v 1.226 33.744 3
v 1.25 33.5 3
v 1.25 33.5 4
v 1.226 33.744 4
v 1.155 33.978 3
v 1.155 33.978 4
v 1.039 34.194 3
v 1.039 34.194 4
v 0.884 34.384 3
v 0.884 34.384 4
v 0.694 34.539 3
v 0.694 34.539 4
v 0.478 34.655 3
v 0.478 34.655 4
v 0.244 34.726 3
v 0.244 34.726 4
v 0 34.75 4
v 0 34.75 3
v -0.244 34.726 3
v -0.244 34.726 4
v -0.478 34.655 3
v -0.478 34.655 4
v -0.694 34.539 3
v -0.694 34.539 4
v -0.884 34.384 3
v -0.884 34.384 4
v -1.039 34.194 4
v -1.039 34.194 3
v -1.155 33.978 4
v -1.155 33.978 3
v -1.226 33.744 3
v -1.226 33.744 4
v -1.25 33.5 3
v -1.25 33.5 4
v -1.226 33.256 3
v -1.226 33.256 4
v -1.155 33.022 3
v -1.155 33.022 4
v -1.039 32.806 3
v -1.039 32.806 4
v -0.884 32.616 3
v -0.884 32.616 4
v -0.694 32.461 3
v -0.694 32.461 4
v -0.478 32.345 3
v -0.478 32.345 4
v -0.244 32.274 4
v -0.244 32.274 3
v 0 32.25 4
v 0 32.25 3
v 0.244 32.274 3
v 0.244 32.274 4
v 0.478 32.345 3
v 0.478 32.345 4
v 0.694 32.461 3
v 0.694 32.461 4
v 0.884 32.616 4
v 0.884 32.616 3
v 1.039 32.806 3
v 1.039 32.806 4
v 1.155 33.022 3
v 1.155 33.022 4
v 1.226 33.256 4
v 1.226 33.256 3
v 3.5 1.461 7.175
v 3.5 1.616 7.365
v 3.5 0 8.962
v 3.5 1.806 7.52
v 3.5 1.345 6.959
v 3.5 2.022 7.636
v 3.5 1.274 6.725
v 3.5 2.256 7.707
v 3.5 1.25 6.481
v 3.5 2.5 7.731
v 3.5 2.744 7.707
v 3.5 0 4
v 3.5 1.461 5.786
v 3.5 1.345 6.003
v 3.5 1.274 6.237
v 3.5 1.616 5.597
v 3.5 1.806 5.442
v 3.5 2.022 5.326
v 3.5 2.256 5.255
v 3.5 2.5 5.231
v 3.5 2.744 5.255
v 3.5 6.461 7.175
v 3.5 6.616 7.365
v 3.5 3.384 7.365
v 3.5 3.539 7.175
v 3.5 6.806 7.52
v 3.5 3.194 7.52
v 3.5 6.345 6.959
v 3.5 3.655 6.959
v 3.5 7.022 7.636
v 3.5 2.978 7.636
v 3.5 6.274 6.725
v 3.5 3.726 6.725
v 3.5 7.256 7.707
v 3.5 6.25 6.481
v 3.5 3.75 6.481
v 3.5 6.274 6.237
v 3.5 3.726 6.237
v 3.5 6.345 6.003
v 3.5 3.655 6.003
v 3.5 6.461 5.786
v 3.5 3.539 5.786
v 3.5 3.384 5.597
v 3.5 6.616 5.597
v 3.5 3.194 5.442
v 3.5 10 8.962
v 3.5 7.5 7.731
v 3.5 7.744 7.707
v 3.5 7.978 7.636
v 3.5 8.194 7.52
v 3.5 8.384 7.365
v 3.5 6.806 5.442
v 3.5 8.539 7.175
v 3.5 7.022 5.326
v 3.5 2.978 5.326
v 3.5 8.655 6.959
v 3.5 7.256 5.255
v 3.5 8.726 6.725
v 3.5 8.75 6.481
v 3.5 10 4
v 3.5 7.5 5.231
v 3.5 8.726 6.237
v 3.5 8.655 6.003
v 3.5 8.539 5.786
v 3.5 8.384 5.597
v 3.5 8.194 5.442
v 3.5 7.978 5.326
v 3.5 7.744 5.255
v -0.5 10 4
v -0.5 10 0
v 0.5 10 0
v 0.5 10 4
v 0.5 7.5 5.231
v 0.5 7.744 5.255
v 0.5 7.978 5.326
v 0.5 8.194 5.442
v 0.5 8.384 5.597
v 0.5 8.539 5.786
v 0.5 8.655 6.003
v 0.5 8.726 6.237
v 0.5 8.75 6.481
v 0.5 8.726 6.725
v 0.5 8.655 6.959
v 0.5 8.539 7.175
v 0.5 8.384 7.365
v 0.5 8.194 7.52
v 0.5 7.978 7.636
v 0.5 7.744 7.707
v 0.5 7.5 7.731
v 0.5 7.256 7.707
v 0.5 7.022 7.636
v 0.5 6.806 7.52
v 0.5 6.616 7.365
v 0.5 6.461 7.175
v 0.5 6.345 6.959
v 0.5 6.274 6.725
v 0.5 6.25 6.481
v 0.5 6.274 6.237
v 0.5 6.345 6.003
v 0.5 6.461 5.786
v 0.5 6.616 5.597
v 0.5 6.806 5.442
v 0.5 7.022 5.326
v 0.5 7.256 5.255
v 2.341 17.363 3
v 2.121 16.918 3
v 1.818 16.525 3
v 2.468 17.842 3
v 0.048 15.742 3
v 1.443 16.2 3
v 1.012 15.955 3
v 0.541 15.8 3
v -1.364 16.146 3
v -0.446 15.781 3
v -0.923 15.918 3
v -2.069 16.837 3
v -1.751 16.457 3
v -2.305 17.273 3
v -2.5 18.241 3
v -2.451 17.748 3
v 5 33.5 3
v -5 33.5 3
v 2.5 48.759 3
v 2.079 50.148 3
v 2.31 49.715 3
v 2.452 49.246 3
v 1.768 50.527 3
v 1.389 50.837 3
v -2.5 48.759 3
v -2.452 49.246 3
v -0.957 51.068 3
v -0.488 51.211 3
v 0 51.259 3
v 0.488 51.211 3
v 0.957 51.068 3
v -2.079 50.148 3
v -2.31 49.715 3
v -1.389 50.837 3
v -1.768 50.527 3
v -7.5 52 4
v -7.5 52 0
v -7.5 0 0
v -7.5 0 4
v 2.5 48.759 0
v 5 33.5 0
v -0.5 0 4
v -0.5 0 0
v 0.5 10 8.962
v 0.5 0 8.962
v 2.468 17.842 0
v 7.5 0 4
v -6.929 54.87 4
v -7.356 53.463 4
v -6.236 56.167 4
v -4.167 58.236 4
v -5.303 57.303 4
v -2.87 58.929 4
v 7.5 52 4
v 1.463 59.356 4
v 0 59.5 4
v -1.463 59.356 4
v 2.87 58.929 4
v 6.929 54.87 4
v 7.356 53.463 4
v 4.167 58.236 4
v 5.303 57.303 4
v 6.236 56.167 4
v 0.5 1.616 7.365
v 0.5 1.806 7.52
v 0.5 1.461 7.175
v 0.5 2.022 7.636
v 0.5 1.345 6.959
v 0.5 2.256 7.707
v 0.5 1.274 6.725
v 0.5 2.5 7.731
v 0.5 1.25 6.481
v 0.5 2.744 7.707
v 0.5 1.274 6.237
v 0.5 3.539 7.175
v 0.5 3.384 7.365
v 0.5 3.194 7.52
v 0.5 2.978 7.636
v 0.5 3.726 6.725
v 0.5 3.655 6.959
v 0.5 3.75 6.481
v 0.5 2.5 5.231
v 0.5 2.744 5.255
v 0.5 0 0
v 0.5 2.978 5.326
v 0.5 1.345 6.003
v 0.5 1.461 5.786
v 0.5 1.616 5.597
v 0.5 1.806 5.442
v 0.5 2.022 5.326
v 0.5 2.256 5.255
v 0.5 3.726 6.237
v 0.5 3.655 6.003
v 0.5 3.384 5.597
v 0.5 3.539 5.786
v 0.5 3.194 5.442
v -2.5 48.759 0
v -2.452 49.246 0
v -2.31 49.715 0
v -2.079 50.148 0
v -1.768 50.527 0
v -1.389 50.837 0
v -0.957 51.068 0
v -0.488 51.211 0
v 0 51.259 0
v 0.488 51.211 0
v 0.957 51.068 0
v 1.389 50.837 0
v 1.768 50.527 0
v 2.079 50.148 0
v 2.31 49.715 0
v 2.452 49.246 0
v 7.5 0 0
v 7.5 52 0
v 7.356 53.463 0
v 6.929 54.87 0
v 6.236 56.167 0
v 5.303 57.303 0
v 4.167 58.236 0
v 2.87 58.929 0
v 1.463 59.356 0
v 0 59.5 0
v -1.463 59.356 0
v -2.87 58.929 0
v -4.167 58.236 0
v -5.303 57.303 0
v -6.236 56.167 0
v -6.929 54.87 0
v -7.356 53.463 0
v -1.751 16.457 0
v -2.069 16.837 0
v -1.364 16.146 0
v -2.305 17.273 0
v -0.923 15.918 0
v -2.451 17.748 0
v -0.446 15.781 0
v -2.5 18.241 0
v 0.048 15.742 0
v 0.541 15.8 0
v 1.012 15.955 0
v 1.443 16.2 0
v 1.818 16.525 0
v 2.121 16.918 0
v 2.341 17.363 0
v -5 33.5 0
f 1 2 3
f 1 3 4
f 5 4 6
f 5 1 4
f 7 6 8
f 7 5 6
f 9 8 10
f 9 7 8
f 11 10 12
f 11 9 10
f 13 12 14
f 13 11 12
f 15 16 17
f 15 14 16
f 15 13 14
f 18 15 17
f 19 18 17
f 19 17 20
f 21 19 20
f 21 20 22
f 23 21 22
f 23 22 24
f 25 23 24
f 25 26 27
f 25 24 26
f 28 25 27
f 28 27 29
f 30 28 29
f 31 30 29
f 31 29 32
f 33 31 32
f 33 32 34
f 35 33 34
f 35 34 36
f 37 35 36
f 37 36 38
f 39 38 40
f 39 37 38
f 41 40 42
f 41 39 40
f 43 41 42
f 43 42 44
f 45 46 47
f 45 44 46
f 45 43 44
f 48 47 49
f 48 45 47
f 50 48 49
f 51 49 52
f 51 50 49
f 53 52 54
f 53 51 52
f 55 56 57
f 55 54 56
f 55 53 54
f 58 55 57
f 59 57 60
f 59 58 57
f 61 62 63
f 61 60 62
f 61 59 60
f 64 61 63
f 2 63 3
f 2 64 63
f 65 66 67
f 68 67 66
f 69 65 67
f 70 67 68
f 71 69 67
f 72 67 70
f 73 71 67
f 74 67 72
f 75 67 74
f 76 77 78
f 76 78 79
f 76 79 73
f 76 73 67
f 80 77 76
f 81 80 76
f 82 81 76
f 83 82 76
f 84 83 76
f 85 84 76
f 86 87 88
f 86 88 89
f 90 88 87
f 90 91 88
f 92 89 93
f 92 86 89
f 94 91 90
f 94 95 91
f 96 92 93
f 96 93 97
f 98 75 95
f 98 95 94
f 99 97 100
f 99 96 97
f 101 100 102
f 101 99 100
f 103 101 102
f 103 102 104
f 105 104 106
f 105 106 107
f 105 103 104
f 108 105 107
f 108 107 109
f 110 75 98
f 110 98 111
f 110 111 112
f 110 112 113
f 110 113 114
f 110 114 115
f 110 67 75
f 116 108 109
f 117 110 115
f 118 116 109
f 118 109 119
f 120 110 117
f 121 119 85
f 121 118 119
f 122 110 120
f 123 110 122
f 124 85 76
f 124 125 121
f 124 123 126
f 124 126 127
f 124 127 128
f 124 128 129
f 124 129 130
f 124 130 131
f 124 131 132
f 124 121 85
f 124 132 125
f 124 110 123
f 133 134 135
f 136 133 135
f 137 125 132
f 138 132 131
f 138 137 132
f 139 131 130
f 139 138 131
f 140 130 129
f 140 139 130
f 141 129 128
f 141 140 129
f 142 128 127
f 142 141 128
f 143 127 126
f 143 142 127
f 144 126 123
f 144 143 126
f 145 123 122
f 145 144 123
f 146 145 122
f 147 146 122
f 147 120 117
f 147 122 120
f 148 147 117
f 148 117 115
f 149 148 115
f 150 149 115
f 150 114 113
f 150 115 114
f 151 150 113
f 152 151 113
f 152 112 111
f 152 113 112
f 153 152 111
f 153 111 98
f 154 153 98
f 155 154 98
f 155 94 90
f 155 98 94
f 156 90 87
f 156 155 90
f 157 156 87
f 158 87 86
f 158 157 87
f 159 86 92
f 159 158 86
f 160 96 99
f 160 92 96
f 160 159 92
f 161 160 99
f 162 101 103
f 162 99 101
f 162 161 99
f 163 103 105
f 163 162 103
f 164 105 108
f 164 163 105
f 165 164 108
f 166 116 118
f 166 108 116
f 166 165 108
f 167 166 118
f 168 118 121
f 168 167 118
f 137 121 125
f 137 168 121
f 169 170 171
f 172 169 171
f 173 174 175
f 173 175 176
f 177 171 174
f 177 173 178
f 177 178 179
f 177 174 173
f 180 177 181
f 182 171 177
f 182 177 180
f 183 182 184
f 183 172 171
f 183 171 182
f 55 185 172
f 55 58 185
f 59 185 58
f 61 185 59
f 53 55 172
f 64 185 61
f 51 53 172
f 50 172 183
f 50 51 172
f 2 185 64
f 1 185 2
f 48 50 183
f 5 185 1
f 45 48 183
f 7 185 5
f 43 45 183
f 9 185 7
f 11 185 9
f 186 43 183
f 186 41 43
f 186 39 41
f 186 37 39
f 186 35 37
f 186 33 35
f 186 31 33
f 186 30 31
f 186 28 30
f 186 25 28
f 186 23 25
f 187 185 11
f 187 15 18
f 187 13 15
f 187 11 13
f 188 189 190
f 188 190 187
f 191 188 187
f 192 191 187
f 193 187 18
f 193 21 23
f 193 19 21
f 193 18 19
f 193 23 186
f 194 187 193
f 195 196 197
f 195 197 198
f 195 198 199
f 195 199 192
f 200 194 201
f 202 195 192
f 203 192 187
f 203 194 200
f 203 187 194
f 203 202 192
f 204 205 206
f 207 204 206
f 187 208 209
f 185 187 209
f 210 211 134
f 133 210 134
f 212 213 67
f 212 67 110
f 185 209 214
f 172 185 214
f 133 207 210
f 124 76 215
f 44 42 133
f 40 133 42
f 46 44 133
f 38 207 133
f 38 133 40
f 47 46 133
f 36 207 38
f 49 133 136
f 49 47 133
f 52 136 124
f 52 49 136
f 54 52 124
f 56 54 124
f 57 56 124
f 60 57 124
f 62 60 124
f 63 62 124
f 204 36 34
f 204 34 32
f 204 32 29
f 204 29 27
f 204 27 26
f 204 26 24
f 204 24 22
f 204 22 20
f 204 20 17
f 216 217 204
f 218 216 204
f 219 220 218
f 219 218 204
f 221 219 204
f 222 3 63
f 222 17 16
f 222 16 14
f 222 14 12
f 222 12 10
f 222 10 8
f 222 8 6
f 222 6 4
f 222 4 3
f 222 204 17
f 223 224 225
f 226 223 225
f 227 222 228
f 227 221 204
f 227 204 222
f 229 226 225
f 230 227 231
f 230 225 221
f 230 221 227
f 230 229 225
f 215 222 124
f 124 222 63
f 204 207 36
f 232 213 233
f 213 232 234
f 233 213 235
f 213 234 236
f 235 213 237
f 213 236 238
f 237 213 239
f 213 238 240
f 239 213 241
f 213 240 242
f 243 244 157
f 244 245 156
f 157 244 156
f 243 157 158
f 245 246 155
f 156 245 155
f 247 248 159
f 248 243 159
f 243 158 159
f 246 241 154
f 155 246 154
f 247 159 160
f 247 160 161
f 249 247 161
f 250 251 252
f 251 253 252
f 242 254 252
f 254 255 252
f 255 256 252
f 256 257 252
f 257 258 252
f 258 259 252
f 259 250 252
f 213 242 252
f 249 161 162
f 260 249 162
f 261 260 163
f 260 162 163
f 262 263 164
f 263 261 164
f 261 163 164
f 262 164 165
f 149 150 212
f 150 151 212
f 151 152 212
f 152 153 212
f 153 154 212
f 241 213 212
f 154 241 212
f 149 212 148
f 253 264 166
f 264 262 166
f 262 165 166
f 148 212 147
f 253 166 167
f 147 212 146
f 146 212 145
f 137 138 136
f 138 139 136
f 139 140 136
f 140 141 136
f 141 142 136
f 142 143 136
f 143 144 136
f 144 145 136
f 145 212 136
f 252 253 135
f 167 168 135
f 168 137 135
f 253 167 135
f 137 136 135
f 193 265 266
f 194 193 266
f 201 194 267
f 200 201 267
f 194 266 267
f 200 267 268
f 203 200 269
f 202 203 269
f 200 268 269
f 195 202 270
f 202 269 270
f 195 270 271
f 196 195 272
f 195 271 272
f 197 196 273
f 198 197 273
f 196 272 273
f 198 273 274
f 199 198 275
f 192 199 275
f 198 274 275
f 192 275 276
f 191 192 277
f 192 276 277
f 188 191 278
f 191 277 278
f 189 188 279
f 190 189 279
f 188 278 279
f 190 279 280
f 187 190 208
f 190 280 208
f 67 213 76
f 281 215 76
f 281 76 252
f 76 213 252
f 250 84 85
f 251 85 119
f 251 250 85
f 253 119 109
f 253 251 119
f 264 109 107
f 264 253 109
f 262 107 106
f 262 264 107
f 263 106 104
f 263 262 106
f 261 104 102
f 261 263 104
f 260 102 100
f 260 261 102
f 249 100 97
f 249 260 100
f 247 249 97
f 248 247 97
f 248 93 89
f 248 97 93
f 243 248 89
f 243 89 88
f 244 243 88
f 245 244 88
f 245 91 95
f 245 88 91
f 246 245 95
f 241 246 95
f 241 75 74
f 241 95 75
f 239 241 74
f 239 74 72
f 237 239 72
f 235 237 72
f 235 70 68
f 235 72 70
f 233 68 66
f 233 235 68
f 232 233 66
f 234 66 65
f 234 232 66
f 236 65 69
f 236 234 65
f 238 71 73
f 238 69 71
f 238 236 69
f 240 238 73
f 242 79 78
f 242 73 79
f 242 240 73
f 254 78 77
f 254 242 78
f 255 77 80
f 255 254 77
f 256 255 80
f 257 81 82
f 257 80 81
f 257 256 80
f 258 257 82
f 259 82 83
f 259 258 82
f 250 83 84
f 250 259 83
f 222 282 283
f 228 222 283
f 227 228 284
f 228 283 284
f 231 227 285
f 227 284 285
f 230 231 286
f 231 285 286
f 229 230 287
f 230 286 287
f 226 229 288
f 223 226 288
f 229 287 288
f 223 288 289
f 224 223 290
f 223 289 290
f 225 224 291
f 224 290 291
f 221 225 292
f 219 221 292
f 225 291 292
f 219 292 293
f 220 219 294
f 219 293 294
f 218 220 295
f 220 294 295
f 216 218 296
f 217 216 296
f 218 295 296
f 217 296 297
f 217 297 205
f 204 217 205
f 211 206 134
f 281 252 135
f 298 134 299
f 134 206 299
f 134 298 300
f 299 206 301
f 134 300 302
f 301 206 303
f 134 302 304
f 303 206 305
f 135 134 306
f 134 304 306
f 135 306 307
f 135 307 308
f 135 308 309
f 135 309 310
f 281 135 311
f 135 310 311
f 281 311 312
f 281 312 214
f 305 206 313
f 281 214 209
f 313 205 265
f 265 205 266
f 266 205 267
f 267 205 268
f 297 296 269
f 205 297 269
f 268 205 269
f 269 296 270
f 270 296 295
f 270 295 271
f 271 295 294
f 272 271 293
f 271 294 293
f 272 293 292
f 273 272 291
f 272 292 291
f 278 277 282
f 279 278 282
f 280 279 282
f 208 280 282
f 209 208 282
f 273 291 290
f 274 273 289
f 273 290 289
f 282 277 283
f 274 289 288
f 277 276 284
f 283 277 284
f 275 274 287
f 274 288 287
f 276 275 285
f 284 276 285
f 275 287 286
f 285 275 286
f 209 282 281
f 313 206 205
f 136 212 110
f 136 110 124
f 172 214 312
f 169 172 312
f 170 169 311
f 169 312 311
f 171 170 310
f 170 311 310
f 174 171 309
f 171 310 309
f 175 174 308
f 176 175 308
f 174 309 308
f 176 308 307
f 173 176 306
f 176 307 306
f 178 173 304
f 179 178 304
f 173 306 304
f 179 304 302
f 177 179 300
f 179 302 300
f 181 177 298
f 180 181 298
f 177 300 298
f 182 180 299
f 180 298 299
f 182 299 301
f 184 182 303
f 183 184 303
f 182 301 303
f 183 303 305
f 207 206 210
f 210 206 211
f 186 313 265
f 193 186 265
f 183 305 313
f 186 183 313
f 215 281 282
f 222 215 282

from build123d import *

# Parameters (mm, degrees)
EXTRUDE_1_DEPTH     = 4
CUT_EXTRUDE_1_DEPTH = 3
SKETCH_5_R          = 1.25
CUT_EXTRUDE_2_DEPTH = 12.4
SKETCH_6_W          = 1
SKETCH_6_H          = 10
CUT_EXTRUDE_3_DEPTH = 16.3
SKETCH_9_W          = 5
SKETCH_9_H          = 10
EXTRUDE_4_DEPTH     = 3
SKETCH_10_R         = 1.25
CUT_EXTRUDE_4_DEPTH = 5.1


with BuildPart() as part:
    # 草圖1 → 填料-伸長1 (new body)
    with BuildSketch(Plane.XY):
        with BuildLine():
            Line((7.5, 0), (7.5, 52))
            ThreePointArc((7.5, 52), (0, 59.5), (-7.5, 52))
            Line((-7.5, 52), (-7.5, 0))
            Line((-7.5, 0), (7.5, 0))
        make_face()
    extrude(amount=EXTRUDE_1_DEPTH)

    # 草圖3 → 除料-伸長1 (cut)
    with BuildSketch(Plane.XY):
        with BuildLine():
            ThreePointArc((-2.5, 48.75876512), (0, 51.25876512), (2.5, 48.75876512))
            Line((2.5, 48.75876512), (5, 33.5))
            Line((5, 33.5), (2.467939071, 17.842139978))
            ThreePointArc((2.467939071, 17.842139978), (-0.200190311, 15.749263002), (-2.5, 18.24123488))
            Line((-2.5, 18.24123488), (-5, 33.5))
            Line((-5, 33.5), (-2.5, 48.75876512))
        make_face()
    extrude(amount=CUT_EXTRUDE_1_DEPTH, mode=Mode.SUBTRACT)

    # 草圖5 → 除料-伸長2 (cut)
    with BuildSketch(Plane.XY):
        with Locations((0, 33.5)):
            Circle(SKETCH_5_R)
    extrude(amount=CUT_EXTRUDE_2_DEPTH, mode=Mode.SUBTRACT)

    # 草圖6 → 除料-伸長3 (cut)
    with BuildSketch(Plane.XY):
        with Locations((0, 5)):
            Rectangle(SKETCH_6_W, SKETCH_6_H)
    extrude(amount=CUT_EXTRUDE_3_DEPTH, mode=Mode.SUBTRACT)

    # 草圖9 → 填料-伸長4 (add)
    with BuildSketch(Plane(origin=(0.5, 0, 0), x_dir=(0, 0, -1), z_dir=(1, 0, 0))):
        with Locations((-6.46178466, 5)):
            Rectangle(SKETCH_9_W, SKETCH_9_H)
    extrude(amount=EXTRUDE_4_DEPTH)

    # 草圖10 → 除料-伸長4 (cut)
    with BuildSketch(Plane(origin=(0.5, 0, 0), x_dir=(0, 0, -1), z_dir=(1, 0, 0))):
        with Locations((-6.48089233, 7.5)):
            Circle(SKETCH_10_R)
        with Locations((-6.48089233, 2.5)):
            Circle(SKETCH_10_R)
    extrude(amount=CUT_EXTRUDE_4_DEPTH, mode=Mode.SUBTRACT)


solid = part.part
